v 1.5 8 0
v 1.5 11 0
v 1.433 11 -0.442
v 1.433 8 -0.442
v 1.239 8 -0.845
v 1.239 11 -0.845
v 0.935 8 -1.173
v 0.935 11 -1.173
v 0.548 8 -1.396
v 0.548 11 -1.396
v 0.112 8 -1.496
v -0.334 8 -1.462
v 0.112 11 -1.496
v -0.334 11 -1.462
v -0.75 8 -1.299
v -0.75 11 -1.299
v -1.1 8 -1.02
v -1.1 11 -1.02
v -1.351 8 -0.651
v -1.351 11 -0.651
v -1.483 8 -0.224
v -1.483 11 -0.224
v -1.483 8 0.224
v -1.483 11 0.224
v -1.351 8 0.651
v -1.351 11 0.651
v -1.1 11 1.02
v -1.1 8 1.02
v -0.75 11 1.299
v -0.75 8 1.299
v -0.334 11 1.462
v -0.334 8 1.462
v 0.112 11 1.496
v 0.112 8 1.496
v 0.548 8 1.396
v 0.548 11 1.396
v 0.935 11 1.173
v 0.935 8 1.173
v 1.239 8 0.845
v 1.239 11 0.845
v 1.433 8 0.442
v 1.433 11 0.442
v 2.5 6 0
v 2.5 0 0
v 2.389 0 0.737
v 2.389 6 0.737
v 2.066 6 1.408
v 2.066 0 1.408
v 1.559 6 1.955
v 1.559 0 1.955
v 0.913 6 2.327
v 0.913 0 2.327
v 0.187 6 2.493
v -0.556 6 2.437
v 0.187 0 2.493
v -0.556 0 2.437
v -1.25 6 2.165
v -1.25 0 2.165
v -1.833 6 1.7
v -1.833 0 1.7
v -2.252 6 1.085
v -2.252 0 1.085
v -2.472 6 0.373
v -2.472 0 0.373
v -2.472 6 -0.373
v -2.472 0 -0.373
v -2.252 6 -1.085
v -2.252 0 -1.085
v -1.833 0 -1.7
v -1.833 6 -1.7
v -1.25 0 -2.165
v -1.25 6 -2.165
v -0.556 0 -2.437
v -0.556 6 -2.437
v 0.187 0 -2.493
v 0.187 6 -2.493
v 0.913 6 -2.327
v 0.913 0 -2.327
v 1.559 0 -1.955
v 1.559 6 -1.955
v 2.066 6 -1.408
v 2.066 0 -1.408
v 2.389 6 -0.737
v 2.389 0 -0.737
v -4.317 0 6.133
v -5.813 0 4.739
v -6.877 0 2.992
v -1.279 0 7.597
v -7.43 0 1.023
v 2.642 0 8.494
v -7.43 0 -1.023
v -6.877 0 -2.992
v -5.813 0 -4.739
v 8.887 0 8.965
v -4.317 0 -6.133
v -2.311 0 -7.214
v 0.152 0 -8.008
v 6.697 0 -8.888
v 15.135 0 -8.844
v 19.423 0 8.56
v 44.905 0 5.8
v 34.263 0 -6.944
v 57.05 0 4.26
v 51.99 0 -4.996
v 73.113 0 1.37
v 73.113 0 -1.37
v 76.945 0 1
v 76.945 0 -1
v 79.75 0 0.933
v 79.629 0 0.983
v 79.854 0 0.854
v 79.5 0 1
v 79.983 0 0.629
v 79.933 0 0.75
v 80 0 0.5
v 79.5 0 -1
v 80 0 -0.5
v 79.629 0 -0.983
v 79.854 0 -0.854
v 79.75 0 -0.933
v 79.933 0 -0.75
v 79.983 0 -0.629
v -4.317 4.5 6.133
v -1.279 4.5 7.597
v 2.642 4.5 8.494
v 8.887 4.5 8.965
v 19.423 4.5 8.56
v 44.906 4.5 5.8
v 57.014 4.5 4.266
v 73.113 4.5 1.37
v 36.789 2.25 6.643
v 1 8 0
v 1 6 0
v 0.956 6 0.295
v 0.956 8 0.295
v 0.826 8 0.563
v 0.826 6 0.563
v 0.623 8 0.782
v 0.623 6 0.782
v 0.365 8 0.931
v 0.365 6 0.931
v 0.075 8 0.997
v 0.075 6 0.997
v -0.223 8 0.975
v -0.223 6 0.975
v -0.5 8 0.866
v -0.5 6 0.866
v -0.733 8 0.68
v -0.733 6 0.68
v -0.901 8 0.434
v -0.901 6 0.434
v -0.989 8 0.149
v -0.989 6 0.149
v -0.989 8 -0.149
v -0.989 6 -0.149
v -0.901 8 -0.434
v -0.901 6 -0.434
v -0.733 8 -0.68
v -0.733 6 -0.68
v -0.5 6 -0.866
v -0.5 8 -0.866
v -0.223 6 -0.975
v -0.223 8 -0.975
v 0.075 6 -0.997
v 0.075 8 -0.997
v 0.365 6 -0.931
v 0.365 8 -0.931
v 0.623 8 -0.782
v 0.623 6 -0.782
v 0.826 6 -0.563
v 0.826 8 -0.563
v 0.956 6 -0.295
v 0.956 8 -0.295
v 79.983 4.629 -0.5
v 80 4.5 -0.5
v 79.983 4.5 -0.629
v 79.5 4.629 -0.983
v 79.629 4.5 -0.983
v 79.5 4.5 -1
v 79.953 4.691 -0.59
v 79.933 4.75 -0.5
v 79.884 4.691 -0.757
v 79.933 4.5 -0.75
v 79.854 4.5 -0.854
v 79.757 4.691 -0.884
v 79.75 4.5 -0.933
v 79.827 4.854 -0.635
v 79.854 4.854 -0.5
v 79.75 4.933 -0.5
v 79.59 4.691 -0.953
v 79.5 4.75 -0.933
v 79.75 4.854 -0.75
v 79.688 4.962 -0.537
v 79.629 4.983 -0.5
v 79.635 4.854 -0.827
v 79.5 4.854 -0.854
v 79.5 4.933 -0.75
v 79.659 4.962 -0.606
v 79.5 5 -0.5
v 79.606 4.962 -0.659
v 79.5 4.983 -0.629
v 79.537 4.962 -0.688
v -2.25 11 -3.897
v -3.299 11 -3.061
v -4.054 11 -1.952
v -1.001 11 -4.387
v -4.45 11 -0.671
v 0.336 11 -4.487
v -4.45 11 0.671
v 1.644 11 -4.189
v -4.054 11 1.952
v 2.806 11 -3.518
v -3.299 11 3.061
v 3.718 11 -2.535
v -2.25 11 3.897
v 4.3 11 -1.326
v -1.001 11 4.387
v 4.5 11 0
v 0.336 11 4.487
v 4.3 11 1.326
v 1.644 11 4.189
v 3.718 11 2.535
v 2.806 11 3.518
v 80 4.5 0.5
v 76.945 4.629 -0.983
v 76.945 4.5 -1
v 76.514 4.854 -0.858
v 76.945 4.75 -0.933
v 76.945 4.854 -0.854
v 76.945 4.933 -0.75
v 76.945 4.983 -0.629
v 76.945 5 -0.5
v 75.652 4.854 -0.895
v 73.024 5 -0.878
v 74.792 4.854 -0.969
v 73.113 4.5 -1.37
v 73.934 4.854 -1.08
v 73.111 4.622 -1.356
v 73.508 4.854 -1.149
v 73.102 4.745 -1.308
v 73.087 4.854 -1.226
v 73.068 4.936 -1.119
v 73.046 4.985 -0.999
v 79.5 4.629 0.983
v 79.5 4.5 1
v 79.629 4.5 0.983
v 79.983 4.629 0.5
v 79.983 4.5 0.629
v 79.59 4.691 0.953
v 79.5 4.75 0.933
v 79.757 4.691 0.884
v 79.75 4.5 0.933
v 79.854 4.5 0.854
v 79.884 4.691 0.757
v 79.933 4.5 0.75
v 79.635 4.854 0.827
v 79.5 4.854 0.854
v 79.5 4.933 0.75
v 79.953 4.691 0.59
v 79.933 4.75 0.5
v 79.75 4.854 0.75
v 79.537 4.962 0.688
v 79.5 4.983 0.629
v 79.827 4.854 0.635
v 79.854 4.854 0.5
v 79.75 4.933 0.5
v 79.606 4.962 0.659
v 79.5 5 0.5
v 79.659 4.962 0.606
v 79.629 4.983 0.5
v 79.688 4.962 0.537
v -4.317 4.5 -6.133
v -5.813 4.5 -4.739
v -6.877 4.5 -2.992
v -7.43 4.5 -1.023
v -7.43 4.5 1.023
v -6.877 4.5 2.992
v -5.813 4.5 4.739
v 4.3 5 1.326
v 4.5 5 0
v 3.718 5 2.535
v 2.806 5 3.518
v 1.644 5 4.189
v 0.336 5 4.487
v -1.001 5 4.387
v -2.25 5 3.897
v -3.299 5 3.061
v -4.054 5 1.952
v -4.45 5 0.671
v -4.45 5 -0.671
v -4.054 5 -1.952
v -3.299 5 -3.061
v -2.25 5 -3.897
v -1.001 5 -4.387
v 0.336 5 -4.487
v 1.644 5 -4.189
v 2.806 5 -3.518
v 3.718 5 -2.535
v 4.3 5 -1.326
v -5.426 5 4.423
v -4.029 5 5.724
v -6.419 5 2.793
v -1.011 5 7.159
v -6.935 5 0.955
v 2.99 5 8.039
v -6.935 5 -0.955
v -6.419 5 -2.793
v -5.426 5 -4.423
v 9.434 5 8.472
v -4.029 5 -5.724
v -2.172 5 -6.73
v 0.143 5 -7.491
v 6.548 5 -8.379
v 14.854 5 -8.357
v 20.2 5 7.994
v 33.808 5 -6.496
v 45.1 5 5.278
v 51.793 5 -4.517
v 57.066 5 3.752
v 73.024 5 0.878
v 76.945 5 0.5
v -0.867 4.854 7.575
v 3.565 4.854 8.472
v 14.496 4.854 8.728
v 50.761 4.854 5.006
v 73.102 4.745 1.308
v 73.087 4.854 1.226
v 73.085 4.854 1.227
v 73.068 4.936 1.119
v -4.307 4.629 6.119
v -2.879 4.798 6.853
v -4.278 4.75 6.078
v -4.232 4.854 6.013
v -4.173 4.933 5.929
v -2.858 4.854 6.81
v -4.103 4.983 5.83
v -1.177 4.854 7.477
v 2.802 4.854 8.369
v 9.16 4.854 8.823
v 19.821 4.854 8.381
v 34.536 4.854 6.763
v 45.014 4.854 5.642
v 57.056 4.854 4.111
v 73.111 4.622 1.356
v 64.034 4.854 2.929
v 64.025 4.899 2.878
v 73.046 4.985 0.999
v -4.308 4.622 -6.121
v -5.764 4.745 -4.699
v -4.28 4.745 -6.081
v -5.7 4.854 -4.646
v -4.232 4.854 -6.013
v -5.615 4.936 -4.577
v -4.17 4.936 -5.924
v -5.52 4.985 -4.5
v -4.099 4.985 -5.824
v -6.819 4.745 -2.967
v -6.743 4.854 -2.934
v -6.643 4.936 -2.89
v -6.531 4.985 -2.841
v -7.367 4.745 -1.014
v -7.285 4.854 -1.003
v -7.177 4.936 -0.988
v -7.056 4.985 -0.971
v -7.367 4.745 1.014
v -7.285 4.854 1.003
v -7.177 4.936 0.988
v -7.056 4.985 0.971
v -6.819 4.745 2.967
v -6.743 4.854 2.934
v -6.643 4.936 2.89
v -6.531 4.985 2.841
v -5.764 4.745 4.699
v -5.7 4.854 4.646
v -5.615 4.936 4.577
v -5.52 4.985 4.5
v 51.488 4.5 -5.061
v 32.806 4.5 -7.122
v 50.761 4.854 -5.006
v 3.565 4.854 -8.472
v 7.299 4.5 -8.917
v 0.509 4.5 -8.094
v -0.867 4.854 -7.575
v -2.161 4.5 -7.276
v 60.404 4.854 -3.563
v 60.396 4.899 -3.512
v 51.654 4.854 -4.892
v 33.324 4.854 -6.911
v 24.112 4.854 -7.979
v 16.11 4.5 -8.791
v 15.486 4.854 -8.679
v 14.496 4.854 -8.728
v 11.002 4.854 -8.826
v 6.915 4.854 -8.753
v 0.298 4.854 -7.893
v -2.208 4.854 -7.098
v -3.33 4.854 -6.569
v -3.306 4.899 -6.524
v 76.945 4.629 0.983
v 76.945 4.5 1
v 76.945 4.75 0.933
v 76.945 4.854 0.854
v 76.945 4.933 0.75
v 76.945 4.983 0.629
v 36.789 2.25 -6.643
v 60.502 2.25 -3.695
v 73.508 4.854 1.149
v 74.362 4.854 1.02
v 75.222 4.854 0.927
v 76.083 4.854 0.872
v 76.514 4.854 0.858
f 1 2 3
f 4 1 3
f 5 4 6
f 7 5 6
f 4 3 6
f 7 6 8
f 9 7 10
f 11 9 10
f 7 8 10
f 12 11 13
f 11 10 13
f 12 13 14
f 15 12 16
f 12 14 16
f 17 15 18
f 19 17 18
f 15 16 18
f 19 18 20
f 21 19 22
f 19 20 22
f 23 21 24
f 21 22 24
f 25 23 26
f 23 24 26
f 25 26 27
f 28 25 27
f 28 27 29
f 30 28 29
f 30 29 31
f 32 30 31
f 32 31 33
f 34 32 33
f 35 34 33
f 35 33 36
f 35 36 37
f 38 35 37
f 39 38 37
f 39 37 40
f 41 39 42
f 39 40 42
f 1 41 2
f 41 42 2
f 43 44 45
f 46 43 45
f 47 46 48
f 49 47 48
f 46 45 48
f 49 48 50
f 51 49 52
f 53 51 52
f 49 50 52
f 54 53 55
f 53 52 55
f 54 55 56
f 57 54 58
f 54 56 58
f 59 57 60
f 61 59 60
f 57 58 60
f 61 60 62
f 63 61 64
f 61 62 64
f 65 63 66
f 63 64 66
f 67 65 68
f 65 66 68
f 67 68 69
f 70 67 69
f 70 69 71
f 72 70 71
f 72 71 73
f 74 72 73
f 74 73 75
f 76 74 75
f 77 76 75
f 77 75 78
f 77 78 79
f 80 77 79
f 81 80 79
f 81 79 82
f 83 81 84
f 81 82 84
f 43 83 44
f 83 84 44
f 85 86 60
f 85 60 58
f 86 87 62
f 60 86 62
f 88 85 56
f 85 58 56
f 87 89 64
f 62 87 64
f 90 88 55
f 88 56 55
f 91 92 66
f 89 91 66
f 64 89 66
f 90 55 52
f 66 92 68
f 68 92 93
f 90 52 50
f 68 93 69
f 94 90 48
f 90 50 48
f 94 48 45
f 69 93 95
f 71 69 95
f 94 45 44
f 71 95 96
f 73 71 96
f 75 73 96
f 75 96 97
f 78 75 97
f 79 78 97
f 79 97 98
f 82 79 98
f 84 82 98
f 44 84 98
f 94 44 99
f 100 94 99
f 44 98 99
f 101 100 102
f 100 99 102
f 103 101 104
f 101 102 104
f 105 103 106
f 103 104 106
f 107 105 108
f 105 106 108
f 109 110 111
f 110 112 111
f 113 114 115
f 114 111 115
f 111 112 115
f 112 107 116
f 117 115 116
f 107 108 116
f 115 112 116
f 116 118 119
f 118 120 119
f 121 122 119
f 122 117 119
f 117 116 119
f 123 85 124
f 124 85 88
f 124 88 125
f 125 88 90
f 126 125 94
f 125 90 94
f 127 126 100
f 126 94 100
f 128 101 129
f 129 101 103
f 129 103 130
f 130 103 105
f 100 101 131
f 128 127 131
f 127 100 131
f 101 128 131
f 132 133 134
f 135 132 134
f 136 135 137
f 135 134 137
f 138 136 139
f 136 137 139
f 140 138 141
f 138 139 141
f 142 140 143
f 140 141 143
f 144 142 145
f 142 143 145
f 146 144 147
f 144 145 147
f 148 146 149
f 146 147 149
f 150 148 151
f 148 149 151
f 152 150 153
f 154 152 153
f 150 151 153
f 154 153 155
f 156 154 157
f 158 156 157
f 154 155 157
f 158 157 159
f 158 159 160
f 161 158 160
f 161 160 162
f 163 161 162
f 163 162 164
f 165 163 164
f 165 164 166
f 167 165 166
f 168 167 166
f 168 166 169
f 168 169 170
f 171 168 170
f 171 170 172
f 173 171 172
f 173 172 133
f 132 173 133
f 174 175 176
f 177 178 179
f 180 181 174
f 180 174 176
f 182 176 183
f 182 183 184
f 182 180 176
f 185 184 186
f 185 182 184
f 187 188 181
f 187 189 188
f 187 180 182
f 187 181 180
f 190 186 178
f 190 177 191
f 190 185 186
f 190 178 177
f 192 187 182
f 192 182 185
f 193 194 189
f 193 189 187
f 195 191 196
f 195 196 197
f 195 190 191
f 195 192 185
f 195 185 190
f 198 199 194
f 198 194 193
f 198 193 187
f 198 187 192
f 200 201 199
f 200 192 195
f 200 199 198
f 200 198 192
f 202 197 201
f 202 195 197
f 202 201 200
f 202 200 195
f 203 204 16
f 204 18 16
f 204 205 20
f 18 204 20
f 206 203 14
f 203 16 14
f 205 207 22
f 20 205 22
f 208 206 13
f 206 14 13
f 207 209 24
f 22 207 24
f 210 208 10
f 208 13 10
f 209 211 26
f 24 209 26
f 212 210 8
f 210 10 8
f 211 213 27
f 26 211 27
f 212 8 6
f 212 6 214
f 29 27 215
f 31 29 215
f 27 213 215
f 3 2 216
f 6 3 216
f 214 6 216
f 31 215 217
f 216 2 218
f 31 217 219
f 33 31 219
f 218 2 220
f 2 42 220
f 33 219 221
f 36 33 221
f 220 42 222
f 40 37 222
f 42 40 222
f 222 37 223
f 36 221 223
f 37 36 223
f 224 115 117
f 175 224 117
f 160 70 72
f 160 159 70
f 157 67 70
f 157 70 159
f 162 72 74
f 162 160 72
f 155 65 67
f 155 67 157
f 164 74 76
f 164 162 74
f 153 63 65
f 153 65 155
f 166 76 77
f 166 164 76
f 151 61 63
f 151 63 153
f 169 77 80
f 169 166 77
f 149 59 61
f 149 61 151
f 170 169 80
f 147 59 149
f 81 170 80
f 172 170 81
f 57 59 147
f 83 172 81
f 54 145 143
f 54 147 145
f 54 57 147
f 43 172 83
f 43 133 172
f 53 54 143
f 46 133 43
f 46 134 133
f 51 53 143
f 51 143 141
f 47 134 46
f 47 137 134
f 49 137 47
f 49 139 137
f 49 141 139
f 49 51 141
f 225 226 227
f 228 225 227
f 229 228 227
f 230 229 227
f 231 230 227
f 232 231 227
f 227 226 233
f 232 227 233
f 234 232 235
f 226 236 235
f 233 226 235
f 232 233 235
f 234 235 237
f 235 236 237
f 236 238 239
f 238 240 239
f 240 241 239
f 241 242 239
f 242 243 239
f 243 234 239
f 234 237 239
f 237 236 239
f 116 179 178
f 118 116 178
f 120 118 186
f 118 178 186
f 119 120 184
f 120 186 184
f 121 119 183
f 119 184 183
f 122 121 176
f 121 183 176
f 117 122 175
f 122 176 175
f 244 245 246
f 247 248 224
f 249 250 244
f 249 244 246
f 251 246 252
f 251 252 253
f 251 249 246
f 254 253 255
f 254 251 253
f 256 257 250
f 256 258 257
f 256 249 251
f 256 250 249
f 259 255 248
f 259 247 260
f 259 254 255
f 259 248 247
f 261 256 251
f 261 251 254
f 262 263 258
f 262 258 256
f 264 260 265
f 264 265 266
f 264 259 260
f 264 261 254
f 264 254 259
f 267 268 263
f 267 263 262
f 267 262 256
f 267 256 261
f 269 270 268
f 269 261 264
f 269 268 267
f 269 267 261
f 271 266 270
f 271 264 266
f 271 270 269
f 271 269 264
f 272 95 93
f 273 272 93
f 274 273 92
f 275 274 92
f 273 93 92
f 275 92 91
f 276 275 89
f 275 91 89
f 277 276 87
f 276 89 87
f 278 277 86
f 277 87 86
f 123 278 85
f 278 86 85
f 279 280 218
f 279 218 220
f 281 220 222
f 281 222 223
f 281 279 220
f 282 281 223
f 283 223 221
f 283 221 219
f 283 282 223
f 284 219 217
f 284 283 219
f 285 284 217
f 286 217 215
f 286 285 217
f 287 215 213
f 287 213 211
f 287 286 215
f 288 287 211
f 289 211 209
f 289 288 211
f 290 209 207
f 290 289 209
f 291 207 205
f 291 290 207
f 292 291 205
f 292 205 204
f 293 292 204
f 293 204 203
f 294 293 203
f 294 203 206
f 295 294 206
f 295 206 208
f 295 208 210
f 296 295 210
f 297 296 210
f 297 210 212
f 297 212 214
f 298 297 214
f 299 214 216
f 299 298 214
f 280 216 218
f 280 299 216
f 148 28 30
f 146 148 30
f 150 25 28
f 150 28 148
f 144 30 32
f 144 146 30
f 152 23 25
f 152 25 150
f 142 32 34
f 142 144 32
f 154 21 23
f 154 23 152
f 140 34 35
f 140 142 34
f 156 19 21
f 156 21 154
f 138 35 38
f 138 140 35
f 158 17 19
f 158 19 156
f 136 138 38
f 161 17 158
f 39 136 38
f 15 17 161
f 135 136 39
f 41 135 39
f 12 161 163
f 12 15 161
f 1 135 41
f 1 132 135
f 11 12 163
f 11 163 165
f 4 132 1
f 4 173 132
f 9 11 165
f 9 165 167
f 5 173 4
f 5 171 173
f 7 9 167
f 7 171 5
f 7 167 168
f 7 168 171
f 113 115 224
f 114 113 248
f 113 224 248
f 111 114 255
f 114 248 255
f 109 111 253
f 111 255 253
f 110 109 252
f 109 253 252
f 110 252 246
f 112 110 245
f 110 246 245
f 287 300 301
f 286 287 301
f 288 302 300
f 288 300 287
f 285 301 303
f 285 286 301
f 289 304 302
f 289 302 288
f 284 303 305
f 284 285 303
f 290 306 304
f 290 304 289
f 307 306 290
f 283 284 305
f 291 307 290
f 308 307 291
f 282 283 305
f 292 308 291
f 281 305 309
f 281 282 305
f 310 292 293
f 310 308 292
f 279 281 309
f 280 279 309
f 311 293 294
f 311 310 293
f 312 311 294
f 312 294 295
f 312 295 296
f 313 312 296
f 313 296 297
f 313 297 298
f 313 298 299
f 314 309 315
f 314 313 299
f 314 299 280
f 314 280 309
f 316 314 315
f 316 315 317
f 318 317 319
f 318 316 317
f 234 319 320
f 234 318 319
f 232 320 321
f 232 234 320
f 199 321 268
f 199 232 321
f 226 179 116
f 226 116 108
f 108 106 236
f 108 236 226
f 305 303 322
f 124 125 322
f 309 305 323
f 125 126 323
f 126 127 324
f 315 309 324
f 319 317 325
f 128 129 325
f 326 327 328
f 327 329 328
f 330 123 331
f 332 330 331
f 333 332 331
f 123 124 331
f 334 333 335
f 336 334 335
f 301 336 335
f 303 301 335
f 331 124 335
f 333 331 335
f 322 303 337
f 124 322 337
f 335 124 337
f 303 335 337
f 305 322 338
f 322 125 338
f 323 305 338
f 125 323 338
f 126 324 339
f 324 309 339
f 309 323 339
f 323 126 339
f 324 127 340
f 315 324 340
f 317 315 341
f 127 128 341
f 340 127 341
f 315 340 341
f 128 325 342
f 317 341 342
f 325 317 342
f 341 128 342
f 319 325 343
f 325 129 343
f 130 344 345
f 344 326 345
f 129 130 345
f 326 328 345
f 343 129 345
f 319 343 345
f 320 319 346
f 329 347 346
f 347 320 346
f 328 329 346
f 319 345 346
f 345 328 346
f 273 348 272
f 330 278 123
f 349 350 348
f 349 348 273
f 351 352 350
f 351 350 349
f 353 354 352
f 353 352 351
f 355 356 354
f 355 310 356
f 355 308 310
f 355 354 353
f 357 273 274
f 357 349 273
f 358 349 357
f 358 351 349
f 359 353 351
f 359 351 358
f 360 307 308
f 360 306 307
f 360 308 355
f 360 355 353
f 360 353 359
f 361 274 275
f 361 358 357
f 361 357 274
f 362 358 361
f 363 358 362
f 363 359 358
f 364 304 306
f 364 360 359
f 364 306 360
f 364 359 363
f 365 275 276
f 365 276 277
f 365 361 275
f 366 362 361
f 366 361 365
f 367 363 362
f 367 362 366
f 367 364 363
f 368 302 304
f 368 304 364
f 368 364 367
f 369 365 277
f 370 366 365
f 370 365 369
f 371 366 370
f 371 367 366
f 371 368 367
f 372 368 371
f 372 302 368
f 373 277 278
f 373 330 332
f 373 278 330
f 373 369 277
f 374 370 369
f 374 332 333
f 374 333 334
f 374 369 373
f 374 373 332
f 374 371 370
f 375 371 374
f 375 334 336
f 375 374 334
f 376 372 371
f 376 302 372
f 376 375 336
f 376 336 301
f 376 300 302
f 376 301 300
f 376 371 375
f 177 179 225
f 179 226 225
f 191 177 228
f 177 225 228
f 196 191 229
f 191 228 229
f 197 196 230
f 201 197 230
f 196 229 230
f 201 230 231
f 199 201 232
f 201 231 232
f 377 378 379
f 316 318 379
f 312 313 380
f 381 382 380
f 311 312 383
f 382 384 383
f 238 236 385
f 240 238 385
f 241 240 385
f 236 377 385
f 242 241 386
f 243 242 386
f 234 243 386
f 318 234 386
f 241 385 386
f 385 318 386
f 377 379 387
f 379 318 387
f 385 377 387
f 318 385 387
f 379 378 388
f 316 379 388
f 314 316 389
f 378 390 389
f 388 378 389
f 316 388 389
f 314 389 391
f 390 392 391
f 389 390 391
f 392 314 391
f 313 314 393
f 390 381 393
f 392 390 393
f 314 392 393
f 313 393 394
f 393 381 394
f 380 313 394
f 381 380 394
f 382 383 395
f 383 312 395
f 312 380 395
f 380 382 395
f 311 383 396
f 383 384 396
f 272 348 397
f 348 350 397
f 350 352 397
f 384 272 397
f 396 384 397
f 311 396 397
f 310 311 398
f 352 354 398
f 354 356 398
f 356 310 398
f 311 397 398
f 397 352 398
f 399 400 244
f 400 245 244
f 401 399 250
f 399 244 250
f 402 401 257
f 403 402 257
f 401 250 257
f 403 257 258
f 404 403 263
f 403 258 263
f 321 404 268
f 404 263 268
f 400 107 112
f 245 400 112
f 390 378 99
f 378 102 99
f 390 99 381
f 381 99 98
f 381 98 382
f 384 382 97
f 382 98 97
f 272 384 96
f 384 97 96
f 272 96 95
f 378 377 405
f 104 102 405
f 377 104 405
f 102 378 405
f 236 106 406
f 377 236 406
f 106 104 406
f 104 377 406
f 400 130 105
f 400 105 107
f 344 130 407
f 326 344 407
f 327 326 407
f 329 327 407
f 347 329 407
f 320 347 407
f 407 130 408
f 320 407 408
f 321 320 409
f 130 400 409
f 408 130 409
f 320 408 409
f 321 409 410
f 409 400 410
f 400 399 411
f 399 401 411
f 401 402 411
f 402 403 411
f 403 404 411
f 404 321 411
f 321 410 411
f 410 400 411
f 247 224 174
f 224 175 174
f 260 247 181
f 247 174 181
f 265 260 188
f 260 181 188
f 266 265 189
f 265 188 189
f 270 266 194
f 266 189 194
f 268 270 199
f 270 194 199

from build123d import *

# Parameters (mm, degrees)
BOSS_EXTRUDE2_DEPTH = 5
FILLET1_R           = 20
FILLET2_R           = 0.5
FILLET3_R           = 0.5
BOSS_EXTRUDE3_START = -5
SKETCH3_R           = 4.5
BOSS_EXTRUDE3_DEPTH = 6
SKETCH4_R           = 1.5
CUT_EXTRUDE2_DEPTH  = 3
SKETCH5_R           = 1
CUT_EXTRUDE3_DEPTH  = 12
SKETCH6_R           = 2.5
CUT_EXTRUDE4_DEPTH  = 6


with BuildPart() as part:
    # Sketch1 → Boss-Extrude2 (new body)
    with BuildSketch(Plane(origin=(0, 0, 0), x_dir=(1, 0, 0), z_dir=(0, 1, 0))):
        with BuildLine():
            add(Edge.make_bspline(
                [(75, 1), (51.048339176, 5.728731358), (45.1182825, 4.898127099), (3.12007861, 11.367310368), (-4.316655623, 6.133227881)],
                knots=[1, 1, 1, 1, 1.470494553, 1.969101002, 1.969101002, 1.969101002, 1.969101002], degree=3))
            ThreePointArc((-4.316655623, 6.133227881), (-7.5, 0), (-4.316655623, -6.133227881))
            add(Edge.make_bspline(
                [(-4.316655623, -6.133227881), (3.12007861, -11.367310368), (45.1182825, -4.898127099), (51.048339176, -5.728731358), (75, -1)],
                knots=[0, 0, 0, 0, 0.498606449, 0.969101002, 0.969101002, 0.969101002, 0.969101002], degree=3))
            Line((75, -1), (80, -1))
            Line((80, -1), (80, 1))
            Line((80, 1), (75, 1))
        make_face()
    extrude(amount=BOSS_EXTRUDE2_DEPTH)

    # Fillet1
    fillet1_edges = [part.edges().sort_by_distance(p)[0] for p in [
        (75, 2.5, -1),
        (75, 2.5, 1),
    ]]
    fillet(fillet1_edges, radius=FILLET1_R)

    # Fillet2
    fillet2_edges = [part.edges().sort_by_distance(p)[0] for p in [
        (80, 2.5, -1),
        (80, 2.5, 1),
    ]]
    fillet(fillet2_edges, radius=FILLET2_R)

    # Fillet3
    fillet3_edges = [part.edges().sort_by_distance(p)[0] for p in [
        (34.320045322, 5, 6.936969607),
        (78.222297367, 5, -1),
        (78.222297367, 5, 1),
        (75.020078886, 5, -1.092809371),
        (75.020078886, 5, 1.092809371),
        (80, 5, 0),
        (34.320045325, 5, -6.936969606),
        (79.853553391, 5, -0.853553391),
        (79.853553391, 5, 0.853553391),
        (-7.5, 5, 0),
    ]]
    fillet(fillet3_edges, radius=FILLET3_R)

    # Sketch3 → Boss-Extrude3 (add)
    with BuildSketch(Plane.XZ.offset(BOSS_EXTRUDE3_START)):
        Circle(SKETCH3_R)
    extrude(amount=-BOSS_EXTRUDE3_DEPTH)

    # Sketch4 → Cut-Extrude2 (cut)
    with BuildSketch(Plane(origin=(0, 11, 0), x_dir=(1, 0, 0), z_dir=(0, 1, 0))):
        Circle(SKETCH4_R)
    extrude(amount=-CUT_EXTRUDE2_DEPTH, mode=Mode.SUBTRACT)

    # Sketch5 → Cut-Extrude3 (cut, through all)
    with BuildSketch(Plane.XZ):
        Circle(SKETCH5_R)
    extrude(amount=-CUT_EXTRUDE3_DEPTH, mode=Mode.SUBTRACT)

    # Sketch6 → Cut-Extrude4 (cut)
    with BuildSketch(Plane.XZ):
        Circle(SKETCH6_R)
    extrude(amount=-CUT_EXTRUDE4_DEPTH, mode=Mode.SUBTRACT)


solid = part.part
